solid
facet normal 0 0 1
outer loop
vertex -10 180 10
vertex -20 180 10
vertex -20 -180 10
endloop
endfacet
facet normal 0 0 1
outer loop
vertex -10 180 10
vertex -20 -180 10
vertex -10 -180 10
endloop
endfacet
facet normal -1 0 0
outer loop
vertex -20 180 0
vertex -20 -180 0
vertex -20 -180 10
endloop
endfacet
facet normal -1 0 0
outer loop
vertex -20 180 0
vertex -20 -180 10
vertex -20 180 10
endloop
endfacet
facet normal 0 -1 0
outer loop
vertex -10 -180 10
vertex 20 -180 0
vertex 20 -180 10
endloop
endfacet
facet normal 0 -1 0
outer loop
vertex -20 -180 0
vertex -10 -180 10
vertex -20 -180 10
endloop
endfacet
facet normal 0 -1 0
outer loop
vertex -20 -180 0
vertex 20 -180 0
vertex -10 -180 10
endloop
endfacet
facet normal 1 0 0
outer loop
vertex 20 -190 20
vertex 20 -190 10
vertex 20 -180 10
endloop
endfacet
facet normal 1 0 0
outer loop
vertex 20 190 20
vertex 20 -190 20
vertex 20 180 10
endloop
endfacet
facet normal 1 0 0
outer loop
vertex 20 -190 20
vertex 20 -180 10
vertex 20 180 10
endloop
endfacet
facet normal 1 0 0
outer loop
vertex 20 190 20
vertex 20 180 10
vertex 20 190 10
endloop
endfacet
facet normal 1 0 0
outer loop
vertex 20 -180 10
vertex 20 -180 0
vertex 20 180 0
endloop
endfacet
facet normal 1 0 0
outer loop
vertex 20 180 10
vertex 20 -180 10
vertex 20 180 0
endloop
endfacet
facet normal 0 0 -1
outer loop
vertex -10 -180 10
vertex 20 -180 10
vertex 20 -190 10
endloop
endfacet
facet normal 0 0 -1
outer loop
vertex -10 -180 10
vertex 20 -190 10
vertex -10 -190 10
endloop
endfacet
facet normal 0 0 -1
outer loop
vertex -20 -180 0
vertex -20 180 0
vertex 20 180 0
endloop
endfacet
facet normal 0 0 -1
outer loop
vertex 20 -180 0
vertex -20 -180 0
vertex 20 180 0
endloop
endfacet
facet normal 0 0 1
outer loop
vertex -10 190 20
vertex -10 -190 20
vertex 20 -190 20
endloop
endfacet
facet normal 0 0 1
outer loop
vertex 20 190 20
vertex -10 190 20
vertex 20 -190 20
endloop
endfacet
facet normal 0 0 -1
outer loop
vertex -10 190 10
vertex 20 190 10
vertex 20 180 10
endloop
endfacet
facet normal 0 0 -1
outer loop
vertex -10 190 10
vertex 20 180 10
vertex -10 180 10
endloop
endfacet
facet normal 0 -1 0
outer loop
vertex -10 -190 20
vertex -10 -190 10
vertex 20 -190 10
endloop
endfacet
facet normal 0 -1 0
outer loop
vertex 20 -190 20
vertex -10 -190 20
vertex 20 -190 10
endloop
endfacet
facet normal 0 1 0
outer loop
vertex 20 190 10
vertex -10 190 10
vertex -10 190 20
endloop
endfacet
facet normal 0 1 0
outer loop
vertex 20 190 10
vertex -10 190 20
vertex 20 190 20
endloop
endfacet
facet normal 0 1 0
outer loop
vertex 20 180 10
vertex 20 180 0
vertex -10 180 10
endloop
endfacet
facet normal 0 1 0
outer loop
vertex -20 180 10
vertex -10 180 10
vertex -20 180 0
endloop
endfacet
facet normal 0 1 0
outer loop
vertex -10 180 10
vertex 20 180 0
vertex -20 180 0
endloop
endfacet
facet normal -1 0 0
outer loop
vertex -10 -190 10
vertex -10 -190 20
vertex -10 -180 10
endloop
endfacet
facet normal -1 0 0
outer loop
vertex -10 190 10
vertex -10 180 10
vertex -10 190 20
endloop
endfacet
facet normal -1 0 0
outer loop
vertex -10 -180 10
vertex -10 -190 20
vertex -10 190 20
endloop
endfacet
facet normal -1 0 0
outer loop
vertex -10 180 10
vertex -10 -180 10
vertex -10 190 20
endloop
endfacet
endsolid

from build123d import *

# Parameters (mm, degrees)
SKETCH1_W           = 40
SKETCH1_H           = 380
BOSS_EXTRUDE1_DEPTH = 20
SKETCH2_W           = 10
SKETCH2_H           = 380
CUT_EXTRUDE1_DEPTH  = 10
SKETCH3_W           = 40
SKETCH3_H           = 10
CUT_EXTRUDE2_DEPTH  = 10


with BuildPart() as part:
    # Sketch1 → Boss-Extrude1 (new body)
    with BuildSketch(Plane.XY):
        Rectangle(SKETCH1_W, SKETCH1_H)
    extrude(amount=BOSS_EXTRUDE1_DEPTH)

    # Sketch2 → Cut-Extrude1 (cut)
    with BuildSketch(Plane.XY.offset(20)):
        with Locations((-15, 0)):
            Rectangle(SKETCH2_W, SKETCH2_H)
    extrude(amount=-CUT_EXTRUDE1_DEPTH, mode=Mode.SUBTRACT)

    # Sketch3 → Cut-Extrude2 (cut)
    with BuildSketch(Plane(origin=(0, 0, 0), x_dir=(-1, 0, 0), z_dir=(0, 0, -1))):
        with Locations((0, 185)):
            Rectangle(SKETCH3_W, SKETCH3_H)
        with Locations((0, -185)):
            Rectangle(SKETCH3_W, SKETCH3_H)
    extrude(amount=-CUT_EXTRUDE2_DEPTH, mode=Mode.SUBTRACT)


solid = part.part
